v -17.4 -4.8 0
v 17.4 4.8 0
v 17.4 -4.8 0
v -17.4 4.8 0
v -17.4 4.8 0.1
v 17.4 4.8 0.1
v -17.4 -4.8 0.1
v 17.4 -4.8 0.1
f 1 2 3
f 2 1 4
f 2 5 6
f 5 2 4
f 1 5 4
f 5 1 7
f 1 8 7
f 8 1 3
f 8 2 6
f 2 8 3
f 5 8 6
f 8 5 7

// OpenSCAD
// file: ../p/box5-12.scad
use <../lib.scad>
function ldraw_lib__box5_12() = [
// 0 Box with 5 Faces without Any Edges
// 0 Name: box5-12.dat
// 0 Author: Chris Dee [cwdee]
// 0 !LDRAW_ORG Primitive UPDATE 2009-02
// 0 !LICENSE Licensed under CC BY 4.0 : see CAreadme.txt
// 
// 0 BFC CERTIFY CCW
  [0,"BFC","CERTIFY"],
  [0,"BFC","CCW"],
// 
// 0 !HISTORY 2009-09-03 [PTadmin] Official Update 2009-02
// 
// 
// 4 16 1 1 1 1 1 -1 -1 1 -1 -1 1 1
  [4,16,1,1,1,1,1,-1,-1,1,-1,-1,1,1],
// 4 16 -1 0 1 1 0 1 1 1 1 -1 1 1
  [4,16,-1,0,1,1,0,1,1,1,1,-1,1,1],
// 4 16 -1 0 -1 -1 0 1 -1 1 1 -1 1 -1
  [4,16,-1,0,-1,-1,0,1,-1,1,1,-1,1,-1],
// 4 16 1 0 -1 -1 0 -1 -1 1 -1 1 1 -1
  [4,16,1,0,-1,-1,0,-1,-1,1,-1,1,1,-1],
// 4 16 1 0 1 1 0 -1 1 1 -1 1 1 1
  [4,16,1,0,1,1,0,-1,1,1,-1,1,1,1],
// 0
];
module ldraw_lib__box5_12(step=0, col=false, unit=2/5, alt=false, line=0.2, solid=!$preview)
    makepoly(ldraw_lib__box5_12(), step=step, col=col, unit=unit, alt=alt, line=line, solid=solid);
ldraw_lib__box5_12(line=0.2);
// main file
use <../lib.scad>
use <../p/box5-12.scad>
function ldraw_lib__821437c() = [
// 0 Sticker  1.2 x  4.4 Yellow
// 0 Name: 821437c.dat
// 0 Author: Chris Böhnke [KnightOfTarenta]
// 0 !LDRAW_ORG Part UPDATE 2026-05
// 0 !LICENSE Licensed under CC BY 4.0 : see CAreadme.txt
// 
// 0 BFC CERTIFY CCW
  [0,"BFC","CERTIFY"],
  [0,"BFC","CCW"],
// 
// 0 !KEYWORDS Bricklink 5581stk01, Brickowl 997456, Magic Flash, Model Team
// 0 !KEYWORDS Rebrickable 821437, Set 5581, van
// 
// 0 !HISTORY 2026-05-31 [OrionP] Official Update 2026-05
// 
// 0 // Sticker Back
// 1 16 0 -0.25 0 43.5 0 0 0 0.25 0 0 0 12 box5-12.dat
  [1,16,0,-0.25,0,43.5,0,0,0,0.25,0,0,0,12, ldraw_lib__box5_12()],
// 
// 0 // Sticker Top
// 0 BFC NOCLIP
  [0,"BFC","NOCLIP"],
// 4 14 -43.5 -.25 -12 43.5 -.25 -12 43.5 -.25 12 -43.5 -.25 12
  [4,14,-43.5,-.25,-12,43.5,-.25,-12,43.5,-.25,12,-43.5,-.25,12],
];
module ldraw_lib__821437c(step=0, col=false, unit=2/5, alt=false, line=0.2, solid=!$preview)
    makepoly(ldraw_lib__821437c(), step=step, col=col, unit=unit, alt=alt, line=line, solid=solid);
ldraw_lib__821437c(line=0.2);
